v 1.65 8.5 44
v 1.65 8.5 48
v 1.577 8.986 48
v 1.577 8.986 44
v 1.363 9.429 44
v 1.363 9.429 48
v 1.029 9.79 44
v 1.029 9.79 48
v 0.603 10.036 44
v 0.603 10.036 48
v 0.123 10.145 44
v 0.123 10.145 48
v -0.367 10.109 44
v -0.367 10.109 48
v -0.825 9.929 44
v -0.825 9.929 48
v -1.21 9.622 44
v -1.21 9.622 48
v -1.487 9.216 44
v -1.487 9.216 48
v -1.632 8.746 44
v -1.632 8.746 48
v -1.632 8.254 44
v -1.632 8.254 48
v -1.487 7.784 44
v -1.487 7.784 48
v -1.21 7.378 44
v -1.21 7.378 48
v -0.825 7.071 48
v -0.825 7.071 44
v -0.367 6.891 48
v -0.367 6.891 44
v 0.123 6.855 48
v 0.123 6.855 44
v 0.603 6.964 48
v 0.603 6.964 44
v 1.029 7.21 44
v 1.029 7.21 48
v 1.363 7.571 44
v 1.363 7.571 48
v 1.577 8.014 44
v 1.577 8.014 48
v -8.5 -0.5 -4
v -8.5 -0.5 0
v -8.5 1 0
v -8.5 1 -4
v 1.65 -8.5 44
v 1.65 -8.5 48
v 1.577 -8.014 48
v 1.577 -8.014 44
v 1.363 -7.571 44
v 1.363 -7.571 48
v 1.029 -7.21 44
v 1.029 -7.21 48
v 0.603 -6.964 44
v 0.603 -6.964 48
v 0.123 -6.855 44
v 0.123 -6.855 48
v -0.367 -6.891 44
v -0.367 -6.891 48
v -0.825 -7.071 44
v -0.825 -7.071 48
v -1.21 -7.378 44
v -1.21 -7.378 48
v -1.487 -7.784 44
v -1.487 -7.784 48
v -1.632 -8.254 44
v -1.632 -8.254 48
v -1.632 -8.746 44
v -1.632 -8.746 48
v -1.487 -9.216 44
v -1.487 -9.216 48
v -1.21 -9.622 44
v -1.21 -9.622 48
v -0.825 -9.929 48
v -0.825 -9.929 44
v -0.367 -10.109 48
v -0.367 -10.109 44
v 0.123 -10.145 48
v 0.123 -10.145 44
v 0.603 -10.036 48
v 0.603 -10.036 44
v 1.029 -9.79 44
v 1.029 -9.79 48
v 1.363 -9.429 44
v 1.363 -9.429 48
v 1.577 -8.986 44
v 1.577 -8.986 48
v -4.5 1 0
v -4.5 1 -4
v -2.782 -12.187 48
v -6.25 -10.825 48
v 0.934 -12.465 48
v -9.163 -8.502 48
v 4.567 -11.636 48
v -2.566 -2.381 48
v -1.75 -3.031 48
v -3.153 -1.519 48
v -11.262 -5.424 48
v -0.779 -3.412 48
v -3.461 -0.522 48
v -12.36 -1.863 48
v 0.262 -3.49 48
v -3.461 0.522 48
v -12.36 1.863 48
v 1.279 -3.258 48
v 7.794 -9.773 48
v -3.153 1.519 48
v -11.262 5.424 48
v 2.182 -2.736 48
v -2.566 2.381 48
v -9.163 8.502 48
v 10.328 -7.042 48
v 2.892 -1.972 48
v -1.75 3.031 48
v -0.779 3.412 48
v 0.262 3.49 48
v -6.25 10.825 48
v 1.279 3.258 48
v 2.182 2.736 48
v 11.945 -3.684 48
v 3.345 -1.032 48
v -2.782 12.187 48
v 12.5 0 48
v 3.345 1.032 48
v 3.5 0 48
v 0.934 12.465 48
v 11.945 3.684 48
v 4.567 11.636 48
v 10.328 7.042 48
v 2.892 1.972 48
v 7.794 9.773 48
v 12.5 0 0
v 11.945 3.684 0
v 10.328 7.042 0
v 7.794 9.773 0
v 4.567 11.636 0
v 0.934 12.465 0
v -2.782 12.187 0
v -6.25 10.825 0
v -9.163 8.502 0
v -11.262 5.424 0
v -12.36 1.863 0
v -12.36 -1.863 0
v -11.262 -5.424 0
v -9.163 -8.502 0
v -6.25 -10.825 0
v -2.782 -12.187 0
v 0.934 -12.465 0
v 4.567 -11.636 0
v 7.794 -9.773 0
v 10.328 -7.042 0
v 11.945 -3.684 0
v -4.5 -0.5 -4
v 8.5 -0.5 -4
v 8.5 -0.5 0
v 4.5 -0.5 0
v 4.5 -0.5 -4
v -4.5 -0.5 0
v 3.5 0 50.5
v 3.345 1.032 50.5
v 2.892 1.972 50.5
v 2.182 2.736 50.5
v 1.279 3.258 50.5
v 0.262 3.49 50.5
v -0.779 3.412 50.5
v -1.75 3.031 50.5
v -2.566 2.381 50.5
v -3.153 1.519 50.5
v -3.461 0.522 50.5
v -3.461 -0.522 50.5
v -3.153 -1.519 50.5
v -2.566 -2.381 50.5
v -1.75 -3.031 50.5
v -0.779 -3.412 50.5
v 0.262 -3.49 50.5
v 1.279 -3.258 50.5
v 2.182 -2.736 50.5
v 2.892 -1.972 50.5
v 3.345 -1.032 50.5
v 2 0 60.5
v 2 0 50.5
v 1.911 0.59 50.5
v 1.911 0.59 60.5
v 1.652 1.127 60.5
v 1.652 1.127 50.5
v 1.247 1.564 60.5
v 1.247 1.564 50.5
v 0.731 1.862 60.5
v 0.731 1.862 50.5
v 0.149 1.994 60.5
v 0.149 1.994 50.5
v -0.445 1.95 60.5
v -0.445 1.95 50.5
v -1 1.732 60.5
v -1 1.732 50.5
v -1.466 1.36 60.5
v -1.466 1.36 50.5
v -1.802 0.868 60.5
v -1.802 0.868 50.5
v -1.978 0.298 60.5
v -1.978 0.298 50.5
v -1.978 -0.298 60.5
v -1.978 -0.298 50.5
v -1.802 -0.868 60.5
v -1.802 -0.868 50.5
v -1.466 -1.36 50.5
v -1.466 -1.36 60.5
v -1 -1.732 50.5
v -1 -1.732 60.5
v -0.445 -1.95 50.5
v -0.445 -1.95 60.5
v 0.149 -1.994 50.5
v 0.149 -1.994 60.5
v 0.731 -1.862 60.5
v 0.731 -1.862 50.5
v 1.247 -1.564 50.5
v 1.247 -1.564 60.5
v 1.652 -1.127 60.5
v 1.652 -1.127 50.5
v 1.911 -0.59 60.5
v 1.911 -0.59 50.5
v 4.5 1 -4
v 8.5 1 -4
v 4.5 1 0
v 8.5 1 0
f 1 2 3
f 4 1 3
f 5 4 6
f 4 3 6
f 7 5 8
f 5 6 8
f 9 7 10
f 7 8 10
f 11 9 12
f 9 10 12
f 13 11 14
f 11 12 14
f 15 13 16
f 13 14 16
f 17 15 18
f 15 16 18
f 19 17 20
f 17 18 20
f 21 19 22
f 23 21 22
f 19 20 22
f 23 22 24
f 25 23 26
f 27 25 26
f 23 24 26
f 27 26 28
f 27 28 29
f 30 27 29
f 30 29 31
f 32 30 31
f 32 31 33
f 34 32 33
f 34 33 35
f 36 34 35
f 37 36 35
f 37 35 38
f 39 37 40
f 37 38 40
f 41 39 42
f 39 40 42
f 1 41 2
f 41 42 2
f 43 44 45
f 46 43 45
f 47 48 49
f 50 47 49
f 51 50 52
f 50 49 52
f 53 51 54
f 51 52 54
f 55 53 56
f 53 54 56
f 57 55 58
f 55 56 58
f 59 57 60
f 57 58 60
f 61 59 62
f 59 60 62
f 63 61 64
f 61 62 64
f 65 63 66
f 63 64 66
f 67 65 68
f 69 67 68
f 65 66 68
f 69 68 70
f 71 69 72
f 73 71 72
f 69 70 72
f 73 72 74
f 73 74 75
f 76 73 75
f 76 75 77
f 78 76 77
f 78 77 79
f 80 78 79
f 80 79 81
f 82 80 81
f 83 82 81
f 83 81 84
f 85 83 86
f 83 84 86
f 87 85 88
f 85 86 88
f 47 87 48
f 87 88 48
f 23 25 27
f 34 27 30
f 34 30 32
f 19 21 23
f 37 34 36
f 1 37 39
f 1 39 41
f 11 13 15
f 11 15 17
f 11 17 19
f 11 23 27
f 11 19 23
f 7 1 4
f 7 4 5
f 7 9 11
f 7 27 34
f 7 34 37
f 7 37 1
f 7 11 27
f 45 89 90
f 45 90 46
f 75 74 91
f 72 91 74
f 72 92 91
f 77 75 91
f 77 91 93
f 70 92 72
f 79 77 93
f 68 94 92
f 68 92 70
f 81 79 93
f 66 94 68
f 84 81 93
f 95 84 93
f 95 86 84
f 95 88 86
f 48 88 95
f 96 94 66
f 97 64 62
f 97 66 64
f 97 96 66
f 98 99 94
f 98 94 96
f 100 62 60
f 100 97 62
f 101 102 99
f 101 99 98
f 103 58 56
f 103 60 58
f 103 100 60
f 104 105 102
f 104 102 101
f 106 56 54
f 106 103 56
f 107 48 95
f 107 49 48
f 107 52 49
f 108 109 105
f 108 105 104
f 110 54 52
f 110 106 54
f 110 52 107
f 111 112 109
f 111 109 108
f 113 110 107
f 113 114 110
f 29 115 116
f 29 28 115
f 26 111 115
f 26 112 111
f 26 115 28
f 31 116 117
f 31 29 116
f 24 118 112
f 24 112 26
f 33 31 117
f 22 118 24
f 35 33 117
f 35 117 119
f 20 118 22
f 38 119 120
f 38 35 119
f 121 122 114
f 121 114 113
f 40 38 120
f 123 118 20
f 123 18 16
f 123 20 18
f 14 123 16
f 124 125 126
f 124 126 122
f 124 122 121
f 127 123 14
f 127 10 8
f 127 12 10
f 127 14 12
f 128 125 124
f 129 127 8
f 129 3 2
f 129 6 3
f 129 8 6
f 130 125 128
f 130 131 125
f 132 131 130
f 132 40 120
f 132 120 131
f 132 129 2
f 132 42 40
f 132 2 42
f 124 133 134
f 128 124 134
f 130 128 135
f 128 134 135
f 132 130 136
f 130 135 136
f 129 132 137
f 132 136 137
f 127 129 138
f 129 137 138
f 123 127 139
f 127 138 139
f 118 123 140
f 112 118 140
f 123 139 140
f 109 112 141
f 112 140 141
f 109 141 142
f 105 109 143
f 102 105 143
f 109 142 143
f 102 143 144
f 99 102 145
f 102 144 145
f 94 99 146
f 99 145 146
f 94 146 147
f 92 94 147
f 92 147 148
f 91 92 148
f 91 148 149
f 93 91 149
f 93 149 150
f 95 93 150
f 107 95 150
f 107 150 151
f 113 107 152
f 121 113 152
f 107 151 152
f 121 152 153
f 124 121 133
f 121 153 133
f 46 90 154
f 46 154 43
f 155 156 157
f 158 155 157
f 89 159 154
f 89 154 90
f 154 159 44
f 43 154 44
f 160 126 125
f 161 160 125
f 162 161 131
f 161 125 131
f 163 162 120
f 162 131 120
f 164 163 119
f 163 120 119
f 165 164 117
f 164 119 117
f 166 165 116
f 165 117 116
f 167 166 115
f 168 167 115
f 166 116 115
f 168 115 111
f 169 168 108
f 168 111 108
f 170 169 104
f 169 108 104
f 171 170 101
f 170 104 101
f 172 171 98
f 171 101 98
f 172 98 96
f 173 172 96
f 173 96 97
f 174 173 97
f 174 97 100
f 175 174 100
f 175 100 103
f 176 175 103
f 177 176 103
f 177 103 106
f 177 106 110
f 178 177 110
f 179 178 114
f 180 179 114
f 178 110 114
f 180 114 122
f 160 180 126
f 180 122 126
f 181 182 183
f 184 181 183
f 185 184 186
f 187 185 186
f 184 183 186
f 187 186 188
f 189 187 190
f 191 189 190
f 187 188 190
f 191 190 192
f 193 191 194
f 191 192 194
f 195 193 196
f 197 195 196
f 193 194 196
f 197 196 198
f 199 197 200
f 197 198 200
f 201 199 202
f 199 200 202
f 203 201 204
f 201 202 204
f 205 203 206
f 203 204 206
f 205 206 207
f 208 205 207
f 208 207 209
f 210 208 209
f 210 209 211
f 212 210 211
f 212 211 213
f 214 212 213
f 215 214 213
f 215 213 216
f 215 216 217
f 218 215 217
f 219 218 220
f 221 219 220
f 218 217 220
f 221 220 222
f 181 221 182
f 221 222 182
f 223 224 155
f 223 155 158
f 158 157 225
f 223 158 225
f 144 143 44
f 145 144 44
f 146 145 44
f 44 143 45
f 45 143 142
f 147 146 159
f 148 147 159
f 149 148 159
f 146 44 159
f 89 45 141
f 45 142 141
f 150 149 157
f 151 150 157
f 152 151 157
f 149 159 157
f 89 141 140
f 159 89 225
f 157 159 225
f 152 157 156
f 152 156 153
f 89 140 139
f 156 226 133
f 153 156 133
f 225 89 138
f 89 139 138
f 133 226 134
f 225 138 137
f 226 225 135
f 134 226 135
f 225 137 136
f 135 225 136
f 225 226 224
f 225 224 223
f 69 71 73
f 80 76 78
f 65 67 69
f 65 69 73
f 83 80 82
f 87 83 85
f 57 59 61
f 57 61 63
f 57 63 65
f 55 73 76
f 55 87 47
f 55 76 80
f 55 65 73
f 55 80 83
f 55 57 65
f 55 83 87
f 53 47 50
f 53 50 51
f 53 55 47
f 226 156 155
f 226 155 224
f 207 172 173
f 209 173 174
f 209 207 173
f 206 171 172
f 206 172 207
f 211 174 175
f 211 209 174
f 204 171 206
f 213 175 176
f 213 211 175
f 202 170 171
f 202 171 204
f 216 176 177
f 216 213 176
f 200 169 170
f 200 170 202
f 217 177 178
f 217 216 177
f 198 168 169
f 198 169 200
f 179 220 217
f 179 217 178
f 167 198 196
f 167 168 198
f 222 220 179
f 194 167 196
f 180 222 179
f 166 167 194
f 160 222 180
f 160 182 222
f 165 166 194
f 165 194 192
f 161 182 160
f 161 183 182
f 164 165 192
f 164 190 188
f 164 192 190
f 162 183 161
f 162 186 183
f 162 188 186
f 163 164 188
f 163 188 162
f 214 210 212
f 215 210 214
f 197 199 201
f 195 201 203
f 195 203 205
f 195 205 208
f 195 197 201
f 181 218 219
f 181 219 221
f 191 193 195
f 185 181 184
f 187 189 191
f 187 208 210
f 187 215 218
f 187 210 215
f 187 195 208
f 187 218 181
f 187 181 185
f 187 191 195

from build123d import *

# Parameters (mm, degrees)
SKICA1_R                 = 12.5
P_IDAT_VYSUNUT_M1_DEPTH  = 48
SKICA2_R                 = 3.5
P_IDAT_VYSUNUT_M2_DEPTH  = 2.5
SKICA3_R                 = 2
P_IDAT_VYSUNUT_M3_DEPTH  = 10
SKICA4_W                 = 4
SKICA4_H                 = 1.5
P_IDAT_VYSUNUT_M4_DEPTH  = 4
SKICA5_R                 = 1.65
ODEBRAT_VYSUNUT_M1_DEPTH = 4


with BuildPart() as part:
    # Skica1 → Přidat vysunutím1 (new body)
    with BuildSketch(Plane.XY):
        Circle(SKICA1_R)
    extrude(amount=P_IDAT_VYSUNUT_M1_DEPTH)

    # Skica2 → Přidat vysunutím2 (add)
    with BuildSketch(Plane.XY.offset(48)):
        Circle(SKICA2_R)
    extrude(amount=P_IDAT_VYSUNUT_M2_DEPTH)

    # Skica3 → Přidat vysunutím3 (add)
    with BuildSketch(Plane.XY.offset(50.5)):
        Circle(SKICA3_R)
    extrude(amount=P_IDAT_VYSUNUT_M3_DEPTH)

    # Skica4 → Přidat vysunutím4 (add)
    with BuildSketch(Plane(origin=(0, 0, 0), x_dir=(-1, 0, 0), z_dir=(0, 0, -1))):
        with Locations((-6.5, 0.25)):
            Rectangle(SKICA4_W, SKICA4_H)
        with Locations((6.5, 0.25)):
            Rectangle(SKICA4_W, SKICA4_H)
    extrude(amount=P_IDAT_VYSUNUT_M4_DEPTH)

    # Skica5 → Odebrat vysunutím1 (cut)
    with BuildSketch(Plane.XY.offset(48)):
        with Locations((0, 8.5)):
            Circle(SKICA5_R)
        with Locations((0, -8.5)):
            Circle(SKICA5_R)
    extrude(amount=-ODEBRAT_VYSUNUT_M1_DEPTH, mode=Mode.SUBTRACT)


solid = part.part
